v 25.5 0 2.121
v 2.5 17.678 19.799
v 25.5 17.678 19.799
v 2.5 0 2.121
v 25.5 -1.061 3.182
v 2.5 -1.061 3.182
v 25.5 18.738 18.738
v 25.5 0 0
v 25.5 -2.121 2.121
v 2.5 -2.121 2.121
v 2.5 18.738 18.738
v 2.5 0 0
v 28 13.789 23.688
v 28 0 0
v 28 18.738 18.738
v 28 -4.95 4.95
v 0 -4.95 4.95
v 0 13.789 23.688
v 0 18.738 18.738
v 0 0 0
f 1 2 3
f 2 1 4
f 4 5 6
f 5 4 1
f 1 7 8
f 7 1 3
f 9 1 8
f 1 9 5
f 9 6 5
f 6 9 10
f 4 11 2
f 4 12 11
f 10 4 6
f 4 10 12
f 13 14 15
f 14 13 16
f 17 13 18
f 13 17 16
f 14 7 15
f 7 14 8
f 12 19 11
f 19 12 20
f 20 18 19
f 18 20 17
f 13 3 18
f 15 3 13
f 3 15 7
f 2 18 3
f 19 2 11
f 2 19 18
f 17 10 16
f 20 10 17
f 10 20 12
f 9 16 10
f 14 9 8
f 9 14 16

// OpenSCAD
mirrorX=25;
mirrorY=25;
mirrorH=4;

thickness=1.5;

module mirrorHold()
{
  difference(){
    cube([mirrorX+thickness*2, mirrorY+thickness, mirrorH+thickness*2]);
    mirrorHoldCutout();
  }
}

module mirrorHoldCutout()
{
  translate([thickness,thickness,thickness])  cube([mirrorX, mirrorY+1, mirrorH]);
  translate([thickness+1,0-0.5,-0.5])  cube([mirrorX-2, mirrorY+thickness+1, thickness+2]);
}

module telloMirrorHolder(){
  rotate([45,0,0]){
    #translate([thickness,thickness,thickness]) cube([mirrorX, mirrorY, mirrorH]);
    mirrorHold();
  }
}

telloMirrorHolder();
